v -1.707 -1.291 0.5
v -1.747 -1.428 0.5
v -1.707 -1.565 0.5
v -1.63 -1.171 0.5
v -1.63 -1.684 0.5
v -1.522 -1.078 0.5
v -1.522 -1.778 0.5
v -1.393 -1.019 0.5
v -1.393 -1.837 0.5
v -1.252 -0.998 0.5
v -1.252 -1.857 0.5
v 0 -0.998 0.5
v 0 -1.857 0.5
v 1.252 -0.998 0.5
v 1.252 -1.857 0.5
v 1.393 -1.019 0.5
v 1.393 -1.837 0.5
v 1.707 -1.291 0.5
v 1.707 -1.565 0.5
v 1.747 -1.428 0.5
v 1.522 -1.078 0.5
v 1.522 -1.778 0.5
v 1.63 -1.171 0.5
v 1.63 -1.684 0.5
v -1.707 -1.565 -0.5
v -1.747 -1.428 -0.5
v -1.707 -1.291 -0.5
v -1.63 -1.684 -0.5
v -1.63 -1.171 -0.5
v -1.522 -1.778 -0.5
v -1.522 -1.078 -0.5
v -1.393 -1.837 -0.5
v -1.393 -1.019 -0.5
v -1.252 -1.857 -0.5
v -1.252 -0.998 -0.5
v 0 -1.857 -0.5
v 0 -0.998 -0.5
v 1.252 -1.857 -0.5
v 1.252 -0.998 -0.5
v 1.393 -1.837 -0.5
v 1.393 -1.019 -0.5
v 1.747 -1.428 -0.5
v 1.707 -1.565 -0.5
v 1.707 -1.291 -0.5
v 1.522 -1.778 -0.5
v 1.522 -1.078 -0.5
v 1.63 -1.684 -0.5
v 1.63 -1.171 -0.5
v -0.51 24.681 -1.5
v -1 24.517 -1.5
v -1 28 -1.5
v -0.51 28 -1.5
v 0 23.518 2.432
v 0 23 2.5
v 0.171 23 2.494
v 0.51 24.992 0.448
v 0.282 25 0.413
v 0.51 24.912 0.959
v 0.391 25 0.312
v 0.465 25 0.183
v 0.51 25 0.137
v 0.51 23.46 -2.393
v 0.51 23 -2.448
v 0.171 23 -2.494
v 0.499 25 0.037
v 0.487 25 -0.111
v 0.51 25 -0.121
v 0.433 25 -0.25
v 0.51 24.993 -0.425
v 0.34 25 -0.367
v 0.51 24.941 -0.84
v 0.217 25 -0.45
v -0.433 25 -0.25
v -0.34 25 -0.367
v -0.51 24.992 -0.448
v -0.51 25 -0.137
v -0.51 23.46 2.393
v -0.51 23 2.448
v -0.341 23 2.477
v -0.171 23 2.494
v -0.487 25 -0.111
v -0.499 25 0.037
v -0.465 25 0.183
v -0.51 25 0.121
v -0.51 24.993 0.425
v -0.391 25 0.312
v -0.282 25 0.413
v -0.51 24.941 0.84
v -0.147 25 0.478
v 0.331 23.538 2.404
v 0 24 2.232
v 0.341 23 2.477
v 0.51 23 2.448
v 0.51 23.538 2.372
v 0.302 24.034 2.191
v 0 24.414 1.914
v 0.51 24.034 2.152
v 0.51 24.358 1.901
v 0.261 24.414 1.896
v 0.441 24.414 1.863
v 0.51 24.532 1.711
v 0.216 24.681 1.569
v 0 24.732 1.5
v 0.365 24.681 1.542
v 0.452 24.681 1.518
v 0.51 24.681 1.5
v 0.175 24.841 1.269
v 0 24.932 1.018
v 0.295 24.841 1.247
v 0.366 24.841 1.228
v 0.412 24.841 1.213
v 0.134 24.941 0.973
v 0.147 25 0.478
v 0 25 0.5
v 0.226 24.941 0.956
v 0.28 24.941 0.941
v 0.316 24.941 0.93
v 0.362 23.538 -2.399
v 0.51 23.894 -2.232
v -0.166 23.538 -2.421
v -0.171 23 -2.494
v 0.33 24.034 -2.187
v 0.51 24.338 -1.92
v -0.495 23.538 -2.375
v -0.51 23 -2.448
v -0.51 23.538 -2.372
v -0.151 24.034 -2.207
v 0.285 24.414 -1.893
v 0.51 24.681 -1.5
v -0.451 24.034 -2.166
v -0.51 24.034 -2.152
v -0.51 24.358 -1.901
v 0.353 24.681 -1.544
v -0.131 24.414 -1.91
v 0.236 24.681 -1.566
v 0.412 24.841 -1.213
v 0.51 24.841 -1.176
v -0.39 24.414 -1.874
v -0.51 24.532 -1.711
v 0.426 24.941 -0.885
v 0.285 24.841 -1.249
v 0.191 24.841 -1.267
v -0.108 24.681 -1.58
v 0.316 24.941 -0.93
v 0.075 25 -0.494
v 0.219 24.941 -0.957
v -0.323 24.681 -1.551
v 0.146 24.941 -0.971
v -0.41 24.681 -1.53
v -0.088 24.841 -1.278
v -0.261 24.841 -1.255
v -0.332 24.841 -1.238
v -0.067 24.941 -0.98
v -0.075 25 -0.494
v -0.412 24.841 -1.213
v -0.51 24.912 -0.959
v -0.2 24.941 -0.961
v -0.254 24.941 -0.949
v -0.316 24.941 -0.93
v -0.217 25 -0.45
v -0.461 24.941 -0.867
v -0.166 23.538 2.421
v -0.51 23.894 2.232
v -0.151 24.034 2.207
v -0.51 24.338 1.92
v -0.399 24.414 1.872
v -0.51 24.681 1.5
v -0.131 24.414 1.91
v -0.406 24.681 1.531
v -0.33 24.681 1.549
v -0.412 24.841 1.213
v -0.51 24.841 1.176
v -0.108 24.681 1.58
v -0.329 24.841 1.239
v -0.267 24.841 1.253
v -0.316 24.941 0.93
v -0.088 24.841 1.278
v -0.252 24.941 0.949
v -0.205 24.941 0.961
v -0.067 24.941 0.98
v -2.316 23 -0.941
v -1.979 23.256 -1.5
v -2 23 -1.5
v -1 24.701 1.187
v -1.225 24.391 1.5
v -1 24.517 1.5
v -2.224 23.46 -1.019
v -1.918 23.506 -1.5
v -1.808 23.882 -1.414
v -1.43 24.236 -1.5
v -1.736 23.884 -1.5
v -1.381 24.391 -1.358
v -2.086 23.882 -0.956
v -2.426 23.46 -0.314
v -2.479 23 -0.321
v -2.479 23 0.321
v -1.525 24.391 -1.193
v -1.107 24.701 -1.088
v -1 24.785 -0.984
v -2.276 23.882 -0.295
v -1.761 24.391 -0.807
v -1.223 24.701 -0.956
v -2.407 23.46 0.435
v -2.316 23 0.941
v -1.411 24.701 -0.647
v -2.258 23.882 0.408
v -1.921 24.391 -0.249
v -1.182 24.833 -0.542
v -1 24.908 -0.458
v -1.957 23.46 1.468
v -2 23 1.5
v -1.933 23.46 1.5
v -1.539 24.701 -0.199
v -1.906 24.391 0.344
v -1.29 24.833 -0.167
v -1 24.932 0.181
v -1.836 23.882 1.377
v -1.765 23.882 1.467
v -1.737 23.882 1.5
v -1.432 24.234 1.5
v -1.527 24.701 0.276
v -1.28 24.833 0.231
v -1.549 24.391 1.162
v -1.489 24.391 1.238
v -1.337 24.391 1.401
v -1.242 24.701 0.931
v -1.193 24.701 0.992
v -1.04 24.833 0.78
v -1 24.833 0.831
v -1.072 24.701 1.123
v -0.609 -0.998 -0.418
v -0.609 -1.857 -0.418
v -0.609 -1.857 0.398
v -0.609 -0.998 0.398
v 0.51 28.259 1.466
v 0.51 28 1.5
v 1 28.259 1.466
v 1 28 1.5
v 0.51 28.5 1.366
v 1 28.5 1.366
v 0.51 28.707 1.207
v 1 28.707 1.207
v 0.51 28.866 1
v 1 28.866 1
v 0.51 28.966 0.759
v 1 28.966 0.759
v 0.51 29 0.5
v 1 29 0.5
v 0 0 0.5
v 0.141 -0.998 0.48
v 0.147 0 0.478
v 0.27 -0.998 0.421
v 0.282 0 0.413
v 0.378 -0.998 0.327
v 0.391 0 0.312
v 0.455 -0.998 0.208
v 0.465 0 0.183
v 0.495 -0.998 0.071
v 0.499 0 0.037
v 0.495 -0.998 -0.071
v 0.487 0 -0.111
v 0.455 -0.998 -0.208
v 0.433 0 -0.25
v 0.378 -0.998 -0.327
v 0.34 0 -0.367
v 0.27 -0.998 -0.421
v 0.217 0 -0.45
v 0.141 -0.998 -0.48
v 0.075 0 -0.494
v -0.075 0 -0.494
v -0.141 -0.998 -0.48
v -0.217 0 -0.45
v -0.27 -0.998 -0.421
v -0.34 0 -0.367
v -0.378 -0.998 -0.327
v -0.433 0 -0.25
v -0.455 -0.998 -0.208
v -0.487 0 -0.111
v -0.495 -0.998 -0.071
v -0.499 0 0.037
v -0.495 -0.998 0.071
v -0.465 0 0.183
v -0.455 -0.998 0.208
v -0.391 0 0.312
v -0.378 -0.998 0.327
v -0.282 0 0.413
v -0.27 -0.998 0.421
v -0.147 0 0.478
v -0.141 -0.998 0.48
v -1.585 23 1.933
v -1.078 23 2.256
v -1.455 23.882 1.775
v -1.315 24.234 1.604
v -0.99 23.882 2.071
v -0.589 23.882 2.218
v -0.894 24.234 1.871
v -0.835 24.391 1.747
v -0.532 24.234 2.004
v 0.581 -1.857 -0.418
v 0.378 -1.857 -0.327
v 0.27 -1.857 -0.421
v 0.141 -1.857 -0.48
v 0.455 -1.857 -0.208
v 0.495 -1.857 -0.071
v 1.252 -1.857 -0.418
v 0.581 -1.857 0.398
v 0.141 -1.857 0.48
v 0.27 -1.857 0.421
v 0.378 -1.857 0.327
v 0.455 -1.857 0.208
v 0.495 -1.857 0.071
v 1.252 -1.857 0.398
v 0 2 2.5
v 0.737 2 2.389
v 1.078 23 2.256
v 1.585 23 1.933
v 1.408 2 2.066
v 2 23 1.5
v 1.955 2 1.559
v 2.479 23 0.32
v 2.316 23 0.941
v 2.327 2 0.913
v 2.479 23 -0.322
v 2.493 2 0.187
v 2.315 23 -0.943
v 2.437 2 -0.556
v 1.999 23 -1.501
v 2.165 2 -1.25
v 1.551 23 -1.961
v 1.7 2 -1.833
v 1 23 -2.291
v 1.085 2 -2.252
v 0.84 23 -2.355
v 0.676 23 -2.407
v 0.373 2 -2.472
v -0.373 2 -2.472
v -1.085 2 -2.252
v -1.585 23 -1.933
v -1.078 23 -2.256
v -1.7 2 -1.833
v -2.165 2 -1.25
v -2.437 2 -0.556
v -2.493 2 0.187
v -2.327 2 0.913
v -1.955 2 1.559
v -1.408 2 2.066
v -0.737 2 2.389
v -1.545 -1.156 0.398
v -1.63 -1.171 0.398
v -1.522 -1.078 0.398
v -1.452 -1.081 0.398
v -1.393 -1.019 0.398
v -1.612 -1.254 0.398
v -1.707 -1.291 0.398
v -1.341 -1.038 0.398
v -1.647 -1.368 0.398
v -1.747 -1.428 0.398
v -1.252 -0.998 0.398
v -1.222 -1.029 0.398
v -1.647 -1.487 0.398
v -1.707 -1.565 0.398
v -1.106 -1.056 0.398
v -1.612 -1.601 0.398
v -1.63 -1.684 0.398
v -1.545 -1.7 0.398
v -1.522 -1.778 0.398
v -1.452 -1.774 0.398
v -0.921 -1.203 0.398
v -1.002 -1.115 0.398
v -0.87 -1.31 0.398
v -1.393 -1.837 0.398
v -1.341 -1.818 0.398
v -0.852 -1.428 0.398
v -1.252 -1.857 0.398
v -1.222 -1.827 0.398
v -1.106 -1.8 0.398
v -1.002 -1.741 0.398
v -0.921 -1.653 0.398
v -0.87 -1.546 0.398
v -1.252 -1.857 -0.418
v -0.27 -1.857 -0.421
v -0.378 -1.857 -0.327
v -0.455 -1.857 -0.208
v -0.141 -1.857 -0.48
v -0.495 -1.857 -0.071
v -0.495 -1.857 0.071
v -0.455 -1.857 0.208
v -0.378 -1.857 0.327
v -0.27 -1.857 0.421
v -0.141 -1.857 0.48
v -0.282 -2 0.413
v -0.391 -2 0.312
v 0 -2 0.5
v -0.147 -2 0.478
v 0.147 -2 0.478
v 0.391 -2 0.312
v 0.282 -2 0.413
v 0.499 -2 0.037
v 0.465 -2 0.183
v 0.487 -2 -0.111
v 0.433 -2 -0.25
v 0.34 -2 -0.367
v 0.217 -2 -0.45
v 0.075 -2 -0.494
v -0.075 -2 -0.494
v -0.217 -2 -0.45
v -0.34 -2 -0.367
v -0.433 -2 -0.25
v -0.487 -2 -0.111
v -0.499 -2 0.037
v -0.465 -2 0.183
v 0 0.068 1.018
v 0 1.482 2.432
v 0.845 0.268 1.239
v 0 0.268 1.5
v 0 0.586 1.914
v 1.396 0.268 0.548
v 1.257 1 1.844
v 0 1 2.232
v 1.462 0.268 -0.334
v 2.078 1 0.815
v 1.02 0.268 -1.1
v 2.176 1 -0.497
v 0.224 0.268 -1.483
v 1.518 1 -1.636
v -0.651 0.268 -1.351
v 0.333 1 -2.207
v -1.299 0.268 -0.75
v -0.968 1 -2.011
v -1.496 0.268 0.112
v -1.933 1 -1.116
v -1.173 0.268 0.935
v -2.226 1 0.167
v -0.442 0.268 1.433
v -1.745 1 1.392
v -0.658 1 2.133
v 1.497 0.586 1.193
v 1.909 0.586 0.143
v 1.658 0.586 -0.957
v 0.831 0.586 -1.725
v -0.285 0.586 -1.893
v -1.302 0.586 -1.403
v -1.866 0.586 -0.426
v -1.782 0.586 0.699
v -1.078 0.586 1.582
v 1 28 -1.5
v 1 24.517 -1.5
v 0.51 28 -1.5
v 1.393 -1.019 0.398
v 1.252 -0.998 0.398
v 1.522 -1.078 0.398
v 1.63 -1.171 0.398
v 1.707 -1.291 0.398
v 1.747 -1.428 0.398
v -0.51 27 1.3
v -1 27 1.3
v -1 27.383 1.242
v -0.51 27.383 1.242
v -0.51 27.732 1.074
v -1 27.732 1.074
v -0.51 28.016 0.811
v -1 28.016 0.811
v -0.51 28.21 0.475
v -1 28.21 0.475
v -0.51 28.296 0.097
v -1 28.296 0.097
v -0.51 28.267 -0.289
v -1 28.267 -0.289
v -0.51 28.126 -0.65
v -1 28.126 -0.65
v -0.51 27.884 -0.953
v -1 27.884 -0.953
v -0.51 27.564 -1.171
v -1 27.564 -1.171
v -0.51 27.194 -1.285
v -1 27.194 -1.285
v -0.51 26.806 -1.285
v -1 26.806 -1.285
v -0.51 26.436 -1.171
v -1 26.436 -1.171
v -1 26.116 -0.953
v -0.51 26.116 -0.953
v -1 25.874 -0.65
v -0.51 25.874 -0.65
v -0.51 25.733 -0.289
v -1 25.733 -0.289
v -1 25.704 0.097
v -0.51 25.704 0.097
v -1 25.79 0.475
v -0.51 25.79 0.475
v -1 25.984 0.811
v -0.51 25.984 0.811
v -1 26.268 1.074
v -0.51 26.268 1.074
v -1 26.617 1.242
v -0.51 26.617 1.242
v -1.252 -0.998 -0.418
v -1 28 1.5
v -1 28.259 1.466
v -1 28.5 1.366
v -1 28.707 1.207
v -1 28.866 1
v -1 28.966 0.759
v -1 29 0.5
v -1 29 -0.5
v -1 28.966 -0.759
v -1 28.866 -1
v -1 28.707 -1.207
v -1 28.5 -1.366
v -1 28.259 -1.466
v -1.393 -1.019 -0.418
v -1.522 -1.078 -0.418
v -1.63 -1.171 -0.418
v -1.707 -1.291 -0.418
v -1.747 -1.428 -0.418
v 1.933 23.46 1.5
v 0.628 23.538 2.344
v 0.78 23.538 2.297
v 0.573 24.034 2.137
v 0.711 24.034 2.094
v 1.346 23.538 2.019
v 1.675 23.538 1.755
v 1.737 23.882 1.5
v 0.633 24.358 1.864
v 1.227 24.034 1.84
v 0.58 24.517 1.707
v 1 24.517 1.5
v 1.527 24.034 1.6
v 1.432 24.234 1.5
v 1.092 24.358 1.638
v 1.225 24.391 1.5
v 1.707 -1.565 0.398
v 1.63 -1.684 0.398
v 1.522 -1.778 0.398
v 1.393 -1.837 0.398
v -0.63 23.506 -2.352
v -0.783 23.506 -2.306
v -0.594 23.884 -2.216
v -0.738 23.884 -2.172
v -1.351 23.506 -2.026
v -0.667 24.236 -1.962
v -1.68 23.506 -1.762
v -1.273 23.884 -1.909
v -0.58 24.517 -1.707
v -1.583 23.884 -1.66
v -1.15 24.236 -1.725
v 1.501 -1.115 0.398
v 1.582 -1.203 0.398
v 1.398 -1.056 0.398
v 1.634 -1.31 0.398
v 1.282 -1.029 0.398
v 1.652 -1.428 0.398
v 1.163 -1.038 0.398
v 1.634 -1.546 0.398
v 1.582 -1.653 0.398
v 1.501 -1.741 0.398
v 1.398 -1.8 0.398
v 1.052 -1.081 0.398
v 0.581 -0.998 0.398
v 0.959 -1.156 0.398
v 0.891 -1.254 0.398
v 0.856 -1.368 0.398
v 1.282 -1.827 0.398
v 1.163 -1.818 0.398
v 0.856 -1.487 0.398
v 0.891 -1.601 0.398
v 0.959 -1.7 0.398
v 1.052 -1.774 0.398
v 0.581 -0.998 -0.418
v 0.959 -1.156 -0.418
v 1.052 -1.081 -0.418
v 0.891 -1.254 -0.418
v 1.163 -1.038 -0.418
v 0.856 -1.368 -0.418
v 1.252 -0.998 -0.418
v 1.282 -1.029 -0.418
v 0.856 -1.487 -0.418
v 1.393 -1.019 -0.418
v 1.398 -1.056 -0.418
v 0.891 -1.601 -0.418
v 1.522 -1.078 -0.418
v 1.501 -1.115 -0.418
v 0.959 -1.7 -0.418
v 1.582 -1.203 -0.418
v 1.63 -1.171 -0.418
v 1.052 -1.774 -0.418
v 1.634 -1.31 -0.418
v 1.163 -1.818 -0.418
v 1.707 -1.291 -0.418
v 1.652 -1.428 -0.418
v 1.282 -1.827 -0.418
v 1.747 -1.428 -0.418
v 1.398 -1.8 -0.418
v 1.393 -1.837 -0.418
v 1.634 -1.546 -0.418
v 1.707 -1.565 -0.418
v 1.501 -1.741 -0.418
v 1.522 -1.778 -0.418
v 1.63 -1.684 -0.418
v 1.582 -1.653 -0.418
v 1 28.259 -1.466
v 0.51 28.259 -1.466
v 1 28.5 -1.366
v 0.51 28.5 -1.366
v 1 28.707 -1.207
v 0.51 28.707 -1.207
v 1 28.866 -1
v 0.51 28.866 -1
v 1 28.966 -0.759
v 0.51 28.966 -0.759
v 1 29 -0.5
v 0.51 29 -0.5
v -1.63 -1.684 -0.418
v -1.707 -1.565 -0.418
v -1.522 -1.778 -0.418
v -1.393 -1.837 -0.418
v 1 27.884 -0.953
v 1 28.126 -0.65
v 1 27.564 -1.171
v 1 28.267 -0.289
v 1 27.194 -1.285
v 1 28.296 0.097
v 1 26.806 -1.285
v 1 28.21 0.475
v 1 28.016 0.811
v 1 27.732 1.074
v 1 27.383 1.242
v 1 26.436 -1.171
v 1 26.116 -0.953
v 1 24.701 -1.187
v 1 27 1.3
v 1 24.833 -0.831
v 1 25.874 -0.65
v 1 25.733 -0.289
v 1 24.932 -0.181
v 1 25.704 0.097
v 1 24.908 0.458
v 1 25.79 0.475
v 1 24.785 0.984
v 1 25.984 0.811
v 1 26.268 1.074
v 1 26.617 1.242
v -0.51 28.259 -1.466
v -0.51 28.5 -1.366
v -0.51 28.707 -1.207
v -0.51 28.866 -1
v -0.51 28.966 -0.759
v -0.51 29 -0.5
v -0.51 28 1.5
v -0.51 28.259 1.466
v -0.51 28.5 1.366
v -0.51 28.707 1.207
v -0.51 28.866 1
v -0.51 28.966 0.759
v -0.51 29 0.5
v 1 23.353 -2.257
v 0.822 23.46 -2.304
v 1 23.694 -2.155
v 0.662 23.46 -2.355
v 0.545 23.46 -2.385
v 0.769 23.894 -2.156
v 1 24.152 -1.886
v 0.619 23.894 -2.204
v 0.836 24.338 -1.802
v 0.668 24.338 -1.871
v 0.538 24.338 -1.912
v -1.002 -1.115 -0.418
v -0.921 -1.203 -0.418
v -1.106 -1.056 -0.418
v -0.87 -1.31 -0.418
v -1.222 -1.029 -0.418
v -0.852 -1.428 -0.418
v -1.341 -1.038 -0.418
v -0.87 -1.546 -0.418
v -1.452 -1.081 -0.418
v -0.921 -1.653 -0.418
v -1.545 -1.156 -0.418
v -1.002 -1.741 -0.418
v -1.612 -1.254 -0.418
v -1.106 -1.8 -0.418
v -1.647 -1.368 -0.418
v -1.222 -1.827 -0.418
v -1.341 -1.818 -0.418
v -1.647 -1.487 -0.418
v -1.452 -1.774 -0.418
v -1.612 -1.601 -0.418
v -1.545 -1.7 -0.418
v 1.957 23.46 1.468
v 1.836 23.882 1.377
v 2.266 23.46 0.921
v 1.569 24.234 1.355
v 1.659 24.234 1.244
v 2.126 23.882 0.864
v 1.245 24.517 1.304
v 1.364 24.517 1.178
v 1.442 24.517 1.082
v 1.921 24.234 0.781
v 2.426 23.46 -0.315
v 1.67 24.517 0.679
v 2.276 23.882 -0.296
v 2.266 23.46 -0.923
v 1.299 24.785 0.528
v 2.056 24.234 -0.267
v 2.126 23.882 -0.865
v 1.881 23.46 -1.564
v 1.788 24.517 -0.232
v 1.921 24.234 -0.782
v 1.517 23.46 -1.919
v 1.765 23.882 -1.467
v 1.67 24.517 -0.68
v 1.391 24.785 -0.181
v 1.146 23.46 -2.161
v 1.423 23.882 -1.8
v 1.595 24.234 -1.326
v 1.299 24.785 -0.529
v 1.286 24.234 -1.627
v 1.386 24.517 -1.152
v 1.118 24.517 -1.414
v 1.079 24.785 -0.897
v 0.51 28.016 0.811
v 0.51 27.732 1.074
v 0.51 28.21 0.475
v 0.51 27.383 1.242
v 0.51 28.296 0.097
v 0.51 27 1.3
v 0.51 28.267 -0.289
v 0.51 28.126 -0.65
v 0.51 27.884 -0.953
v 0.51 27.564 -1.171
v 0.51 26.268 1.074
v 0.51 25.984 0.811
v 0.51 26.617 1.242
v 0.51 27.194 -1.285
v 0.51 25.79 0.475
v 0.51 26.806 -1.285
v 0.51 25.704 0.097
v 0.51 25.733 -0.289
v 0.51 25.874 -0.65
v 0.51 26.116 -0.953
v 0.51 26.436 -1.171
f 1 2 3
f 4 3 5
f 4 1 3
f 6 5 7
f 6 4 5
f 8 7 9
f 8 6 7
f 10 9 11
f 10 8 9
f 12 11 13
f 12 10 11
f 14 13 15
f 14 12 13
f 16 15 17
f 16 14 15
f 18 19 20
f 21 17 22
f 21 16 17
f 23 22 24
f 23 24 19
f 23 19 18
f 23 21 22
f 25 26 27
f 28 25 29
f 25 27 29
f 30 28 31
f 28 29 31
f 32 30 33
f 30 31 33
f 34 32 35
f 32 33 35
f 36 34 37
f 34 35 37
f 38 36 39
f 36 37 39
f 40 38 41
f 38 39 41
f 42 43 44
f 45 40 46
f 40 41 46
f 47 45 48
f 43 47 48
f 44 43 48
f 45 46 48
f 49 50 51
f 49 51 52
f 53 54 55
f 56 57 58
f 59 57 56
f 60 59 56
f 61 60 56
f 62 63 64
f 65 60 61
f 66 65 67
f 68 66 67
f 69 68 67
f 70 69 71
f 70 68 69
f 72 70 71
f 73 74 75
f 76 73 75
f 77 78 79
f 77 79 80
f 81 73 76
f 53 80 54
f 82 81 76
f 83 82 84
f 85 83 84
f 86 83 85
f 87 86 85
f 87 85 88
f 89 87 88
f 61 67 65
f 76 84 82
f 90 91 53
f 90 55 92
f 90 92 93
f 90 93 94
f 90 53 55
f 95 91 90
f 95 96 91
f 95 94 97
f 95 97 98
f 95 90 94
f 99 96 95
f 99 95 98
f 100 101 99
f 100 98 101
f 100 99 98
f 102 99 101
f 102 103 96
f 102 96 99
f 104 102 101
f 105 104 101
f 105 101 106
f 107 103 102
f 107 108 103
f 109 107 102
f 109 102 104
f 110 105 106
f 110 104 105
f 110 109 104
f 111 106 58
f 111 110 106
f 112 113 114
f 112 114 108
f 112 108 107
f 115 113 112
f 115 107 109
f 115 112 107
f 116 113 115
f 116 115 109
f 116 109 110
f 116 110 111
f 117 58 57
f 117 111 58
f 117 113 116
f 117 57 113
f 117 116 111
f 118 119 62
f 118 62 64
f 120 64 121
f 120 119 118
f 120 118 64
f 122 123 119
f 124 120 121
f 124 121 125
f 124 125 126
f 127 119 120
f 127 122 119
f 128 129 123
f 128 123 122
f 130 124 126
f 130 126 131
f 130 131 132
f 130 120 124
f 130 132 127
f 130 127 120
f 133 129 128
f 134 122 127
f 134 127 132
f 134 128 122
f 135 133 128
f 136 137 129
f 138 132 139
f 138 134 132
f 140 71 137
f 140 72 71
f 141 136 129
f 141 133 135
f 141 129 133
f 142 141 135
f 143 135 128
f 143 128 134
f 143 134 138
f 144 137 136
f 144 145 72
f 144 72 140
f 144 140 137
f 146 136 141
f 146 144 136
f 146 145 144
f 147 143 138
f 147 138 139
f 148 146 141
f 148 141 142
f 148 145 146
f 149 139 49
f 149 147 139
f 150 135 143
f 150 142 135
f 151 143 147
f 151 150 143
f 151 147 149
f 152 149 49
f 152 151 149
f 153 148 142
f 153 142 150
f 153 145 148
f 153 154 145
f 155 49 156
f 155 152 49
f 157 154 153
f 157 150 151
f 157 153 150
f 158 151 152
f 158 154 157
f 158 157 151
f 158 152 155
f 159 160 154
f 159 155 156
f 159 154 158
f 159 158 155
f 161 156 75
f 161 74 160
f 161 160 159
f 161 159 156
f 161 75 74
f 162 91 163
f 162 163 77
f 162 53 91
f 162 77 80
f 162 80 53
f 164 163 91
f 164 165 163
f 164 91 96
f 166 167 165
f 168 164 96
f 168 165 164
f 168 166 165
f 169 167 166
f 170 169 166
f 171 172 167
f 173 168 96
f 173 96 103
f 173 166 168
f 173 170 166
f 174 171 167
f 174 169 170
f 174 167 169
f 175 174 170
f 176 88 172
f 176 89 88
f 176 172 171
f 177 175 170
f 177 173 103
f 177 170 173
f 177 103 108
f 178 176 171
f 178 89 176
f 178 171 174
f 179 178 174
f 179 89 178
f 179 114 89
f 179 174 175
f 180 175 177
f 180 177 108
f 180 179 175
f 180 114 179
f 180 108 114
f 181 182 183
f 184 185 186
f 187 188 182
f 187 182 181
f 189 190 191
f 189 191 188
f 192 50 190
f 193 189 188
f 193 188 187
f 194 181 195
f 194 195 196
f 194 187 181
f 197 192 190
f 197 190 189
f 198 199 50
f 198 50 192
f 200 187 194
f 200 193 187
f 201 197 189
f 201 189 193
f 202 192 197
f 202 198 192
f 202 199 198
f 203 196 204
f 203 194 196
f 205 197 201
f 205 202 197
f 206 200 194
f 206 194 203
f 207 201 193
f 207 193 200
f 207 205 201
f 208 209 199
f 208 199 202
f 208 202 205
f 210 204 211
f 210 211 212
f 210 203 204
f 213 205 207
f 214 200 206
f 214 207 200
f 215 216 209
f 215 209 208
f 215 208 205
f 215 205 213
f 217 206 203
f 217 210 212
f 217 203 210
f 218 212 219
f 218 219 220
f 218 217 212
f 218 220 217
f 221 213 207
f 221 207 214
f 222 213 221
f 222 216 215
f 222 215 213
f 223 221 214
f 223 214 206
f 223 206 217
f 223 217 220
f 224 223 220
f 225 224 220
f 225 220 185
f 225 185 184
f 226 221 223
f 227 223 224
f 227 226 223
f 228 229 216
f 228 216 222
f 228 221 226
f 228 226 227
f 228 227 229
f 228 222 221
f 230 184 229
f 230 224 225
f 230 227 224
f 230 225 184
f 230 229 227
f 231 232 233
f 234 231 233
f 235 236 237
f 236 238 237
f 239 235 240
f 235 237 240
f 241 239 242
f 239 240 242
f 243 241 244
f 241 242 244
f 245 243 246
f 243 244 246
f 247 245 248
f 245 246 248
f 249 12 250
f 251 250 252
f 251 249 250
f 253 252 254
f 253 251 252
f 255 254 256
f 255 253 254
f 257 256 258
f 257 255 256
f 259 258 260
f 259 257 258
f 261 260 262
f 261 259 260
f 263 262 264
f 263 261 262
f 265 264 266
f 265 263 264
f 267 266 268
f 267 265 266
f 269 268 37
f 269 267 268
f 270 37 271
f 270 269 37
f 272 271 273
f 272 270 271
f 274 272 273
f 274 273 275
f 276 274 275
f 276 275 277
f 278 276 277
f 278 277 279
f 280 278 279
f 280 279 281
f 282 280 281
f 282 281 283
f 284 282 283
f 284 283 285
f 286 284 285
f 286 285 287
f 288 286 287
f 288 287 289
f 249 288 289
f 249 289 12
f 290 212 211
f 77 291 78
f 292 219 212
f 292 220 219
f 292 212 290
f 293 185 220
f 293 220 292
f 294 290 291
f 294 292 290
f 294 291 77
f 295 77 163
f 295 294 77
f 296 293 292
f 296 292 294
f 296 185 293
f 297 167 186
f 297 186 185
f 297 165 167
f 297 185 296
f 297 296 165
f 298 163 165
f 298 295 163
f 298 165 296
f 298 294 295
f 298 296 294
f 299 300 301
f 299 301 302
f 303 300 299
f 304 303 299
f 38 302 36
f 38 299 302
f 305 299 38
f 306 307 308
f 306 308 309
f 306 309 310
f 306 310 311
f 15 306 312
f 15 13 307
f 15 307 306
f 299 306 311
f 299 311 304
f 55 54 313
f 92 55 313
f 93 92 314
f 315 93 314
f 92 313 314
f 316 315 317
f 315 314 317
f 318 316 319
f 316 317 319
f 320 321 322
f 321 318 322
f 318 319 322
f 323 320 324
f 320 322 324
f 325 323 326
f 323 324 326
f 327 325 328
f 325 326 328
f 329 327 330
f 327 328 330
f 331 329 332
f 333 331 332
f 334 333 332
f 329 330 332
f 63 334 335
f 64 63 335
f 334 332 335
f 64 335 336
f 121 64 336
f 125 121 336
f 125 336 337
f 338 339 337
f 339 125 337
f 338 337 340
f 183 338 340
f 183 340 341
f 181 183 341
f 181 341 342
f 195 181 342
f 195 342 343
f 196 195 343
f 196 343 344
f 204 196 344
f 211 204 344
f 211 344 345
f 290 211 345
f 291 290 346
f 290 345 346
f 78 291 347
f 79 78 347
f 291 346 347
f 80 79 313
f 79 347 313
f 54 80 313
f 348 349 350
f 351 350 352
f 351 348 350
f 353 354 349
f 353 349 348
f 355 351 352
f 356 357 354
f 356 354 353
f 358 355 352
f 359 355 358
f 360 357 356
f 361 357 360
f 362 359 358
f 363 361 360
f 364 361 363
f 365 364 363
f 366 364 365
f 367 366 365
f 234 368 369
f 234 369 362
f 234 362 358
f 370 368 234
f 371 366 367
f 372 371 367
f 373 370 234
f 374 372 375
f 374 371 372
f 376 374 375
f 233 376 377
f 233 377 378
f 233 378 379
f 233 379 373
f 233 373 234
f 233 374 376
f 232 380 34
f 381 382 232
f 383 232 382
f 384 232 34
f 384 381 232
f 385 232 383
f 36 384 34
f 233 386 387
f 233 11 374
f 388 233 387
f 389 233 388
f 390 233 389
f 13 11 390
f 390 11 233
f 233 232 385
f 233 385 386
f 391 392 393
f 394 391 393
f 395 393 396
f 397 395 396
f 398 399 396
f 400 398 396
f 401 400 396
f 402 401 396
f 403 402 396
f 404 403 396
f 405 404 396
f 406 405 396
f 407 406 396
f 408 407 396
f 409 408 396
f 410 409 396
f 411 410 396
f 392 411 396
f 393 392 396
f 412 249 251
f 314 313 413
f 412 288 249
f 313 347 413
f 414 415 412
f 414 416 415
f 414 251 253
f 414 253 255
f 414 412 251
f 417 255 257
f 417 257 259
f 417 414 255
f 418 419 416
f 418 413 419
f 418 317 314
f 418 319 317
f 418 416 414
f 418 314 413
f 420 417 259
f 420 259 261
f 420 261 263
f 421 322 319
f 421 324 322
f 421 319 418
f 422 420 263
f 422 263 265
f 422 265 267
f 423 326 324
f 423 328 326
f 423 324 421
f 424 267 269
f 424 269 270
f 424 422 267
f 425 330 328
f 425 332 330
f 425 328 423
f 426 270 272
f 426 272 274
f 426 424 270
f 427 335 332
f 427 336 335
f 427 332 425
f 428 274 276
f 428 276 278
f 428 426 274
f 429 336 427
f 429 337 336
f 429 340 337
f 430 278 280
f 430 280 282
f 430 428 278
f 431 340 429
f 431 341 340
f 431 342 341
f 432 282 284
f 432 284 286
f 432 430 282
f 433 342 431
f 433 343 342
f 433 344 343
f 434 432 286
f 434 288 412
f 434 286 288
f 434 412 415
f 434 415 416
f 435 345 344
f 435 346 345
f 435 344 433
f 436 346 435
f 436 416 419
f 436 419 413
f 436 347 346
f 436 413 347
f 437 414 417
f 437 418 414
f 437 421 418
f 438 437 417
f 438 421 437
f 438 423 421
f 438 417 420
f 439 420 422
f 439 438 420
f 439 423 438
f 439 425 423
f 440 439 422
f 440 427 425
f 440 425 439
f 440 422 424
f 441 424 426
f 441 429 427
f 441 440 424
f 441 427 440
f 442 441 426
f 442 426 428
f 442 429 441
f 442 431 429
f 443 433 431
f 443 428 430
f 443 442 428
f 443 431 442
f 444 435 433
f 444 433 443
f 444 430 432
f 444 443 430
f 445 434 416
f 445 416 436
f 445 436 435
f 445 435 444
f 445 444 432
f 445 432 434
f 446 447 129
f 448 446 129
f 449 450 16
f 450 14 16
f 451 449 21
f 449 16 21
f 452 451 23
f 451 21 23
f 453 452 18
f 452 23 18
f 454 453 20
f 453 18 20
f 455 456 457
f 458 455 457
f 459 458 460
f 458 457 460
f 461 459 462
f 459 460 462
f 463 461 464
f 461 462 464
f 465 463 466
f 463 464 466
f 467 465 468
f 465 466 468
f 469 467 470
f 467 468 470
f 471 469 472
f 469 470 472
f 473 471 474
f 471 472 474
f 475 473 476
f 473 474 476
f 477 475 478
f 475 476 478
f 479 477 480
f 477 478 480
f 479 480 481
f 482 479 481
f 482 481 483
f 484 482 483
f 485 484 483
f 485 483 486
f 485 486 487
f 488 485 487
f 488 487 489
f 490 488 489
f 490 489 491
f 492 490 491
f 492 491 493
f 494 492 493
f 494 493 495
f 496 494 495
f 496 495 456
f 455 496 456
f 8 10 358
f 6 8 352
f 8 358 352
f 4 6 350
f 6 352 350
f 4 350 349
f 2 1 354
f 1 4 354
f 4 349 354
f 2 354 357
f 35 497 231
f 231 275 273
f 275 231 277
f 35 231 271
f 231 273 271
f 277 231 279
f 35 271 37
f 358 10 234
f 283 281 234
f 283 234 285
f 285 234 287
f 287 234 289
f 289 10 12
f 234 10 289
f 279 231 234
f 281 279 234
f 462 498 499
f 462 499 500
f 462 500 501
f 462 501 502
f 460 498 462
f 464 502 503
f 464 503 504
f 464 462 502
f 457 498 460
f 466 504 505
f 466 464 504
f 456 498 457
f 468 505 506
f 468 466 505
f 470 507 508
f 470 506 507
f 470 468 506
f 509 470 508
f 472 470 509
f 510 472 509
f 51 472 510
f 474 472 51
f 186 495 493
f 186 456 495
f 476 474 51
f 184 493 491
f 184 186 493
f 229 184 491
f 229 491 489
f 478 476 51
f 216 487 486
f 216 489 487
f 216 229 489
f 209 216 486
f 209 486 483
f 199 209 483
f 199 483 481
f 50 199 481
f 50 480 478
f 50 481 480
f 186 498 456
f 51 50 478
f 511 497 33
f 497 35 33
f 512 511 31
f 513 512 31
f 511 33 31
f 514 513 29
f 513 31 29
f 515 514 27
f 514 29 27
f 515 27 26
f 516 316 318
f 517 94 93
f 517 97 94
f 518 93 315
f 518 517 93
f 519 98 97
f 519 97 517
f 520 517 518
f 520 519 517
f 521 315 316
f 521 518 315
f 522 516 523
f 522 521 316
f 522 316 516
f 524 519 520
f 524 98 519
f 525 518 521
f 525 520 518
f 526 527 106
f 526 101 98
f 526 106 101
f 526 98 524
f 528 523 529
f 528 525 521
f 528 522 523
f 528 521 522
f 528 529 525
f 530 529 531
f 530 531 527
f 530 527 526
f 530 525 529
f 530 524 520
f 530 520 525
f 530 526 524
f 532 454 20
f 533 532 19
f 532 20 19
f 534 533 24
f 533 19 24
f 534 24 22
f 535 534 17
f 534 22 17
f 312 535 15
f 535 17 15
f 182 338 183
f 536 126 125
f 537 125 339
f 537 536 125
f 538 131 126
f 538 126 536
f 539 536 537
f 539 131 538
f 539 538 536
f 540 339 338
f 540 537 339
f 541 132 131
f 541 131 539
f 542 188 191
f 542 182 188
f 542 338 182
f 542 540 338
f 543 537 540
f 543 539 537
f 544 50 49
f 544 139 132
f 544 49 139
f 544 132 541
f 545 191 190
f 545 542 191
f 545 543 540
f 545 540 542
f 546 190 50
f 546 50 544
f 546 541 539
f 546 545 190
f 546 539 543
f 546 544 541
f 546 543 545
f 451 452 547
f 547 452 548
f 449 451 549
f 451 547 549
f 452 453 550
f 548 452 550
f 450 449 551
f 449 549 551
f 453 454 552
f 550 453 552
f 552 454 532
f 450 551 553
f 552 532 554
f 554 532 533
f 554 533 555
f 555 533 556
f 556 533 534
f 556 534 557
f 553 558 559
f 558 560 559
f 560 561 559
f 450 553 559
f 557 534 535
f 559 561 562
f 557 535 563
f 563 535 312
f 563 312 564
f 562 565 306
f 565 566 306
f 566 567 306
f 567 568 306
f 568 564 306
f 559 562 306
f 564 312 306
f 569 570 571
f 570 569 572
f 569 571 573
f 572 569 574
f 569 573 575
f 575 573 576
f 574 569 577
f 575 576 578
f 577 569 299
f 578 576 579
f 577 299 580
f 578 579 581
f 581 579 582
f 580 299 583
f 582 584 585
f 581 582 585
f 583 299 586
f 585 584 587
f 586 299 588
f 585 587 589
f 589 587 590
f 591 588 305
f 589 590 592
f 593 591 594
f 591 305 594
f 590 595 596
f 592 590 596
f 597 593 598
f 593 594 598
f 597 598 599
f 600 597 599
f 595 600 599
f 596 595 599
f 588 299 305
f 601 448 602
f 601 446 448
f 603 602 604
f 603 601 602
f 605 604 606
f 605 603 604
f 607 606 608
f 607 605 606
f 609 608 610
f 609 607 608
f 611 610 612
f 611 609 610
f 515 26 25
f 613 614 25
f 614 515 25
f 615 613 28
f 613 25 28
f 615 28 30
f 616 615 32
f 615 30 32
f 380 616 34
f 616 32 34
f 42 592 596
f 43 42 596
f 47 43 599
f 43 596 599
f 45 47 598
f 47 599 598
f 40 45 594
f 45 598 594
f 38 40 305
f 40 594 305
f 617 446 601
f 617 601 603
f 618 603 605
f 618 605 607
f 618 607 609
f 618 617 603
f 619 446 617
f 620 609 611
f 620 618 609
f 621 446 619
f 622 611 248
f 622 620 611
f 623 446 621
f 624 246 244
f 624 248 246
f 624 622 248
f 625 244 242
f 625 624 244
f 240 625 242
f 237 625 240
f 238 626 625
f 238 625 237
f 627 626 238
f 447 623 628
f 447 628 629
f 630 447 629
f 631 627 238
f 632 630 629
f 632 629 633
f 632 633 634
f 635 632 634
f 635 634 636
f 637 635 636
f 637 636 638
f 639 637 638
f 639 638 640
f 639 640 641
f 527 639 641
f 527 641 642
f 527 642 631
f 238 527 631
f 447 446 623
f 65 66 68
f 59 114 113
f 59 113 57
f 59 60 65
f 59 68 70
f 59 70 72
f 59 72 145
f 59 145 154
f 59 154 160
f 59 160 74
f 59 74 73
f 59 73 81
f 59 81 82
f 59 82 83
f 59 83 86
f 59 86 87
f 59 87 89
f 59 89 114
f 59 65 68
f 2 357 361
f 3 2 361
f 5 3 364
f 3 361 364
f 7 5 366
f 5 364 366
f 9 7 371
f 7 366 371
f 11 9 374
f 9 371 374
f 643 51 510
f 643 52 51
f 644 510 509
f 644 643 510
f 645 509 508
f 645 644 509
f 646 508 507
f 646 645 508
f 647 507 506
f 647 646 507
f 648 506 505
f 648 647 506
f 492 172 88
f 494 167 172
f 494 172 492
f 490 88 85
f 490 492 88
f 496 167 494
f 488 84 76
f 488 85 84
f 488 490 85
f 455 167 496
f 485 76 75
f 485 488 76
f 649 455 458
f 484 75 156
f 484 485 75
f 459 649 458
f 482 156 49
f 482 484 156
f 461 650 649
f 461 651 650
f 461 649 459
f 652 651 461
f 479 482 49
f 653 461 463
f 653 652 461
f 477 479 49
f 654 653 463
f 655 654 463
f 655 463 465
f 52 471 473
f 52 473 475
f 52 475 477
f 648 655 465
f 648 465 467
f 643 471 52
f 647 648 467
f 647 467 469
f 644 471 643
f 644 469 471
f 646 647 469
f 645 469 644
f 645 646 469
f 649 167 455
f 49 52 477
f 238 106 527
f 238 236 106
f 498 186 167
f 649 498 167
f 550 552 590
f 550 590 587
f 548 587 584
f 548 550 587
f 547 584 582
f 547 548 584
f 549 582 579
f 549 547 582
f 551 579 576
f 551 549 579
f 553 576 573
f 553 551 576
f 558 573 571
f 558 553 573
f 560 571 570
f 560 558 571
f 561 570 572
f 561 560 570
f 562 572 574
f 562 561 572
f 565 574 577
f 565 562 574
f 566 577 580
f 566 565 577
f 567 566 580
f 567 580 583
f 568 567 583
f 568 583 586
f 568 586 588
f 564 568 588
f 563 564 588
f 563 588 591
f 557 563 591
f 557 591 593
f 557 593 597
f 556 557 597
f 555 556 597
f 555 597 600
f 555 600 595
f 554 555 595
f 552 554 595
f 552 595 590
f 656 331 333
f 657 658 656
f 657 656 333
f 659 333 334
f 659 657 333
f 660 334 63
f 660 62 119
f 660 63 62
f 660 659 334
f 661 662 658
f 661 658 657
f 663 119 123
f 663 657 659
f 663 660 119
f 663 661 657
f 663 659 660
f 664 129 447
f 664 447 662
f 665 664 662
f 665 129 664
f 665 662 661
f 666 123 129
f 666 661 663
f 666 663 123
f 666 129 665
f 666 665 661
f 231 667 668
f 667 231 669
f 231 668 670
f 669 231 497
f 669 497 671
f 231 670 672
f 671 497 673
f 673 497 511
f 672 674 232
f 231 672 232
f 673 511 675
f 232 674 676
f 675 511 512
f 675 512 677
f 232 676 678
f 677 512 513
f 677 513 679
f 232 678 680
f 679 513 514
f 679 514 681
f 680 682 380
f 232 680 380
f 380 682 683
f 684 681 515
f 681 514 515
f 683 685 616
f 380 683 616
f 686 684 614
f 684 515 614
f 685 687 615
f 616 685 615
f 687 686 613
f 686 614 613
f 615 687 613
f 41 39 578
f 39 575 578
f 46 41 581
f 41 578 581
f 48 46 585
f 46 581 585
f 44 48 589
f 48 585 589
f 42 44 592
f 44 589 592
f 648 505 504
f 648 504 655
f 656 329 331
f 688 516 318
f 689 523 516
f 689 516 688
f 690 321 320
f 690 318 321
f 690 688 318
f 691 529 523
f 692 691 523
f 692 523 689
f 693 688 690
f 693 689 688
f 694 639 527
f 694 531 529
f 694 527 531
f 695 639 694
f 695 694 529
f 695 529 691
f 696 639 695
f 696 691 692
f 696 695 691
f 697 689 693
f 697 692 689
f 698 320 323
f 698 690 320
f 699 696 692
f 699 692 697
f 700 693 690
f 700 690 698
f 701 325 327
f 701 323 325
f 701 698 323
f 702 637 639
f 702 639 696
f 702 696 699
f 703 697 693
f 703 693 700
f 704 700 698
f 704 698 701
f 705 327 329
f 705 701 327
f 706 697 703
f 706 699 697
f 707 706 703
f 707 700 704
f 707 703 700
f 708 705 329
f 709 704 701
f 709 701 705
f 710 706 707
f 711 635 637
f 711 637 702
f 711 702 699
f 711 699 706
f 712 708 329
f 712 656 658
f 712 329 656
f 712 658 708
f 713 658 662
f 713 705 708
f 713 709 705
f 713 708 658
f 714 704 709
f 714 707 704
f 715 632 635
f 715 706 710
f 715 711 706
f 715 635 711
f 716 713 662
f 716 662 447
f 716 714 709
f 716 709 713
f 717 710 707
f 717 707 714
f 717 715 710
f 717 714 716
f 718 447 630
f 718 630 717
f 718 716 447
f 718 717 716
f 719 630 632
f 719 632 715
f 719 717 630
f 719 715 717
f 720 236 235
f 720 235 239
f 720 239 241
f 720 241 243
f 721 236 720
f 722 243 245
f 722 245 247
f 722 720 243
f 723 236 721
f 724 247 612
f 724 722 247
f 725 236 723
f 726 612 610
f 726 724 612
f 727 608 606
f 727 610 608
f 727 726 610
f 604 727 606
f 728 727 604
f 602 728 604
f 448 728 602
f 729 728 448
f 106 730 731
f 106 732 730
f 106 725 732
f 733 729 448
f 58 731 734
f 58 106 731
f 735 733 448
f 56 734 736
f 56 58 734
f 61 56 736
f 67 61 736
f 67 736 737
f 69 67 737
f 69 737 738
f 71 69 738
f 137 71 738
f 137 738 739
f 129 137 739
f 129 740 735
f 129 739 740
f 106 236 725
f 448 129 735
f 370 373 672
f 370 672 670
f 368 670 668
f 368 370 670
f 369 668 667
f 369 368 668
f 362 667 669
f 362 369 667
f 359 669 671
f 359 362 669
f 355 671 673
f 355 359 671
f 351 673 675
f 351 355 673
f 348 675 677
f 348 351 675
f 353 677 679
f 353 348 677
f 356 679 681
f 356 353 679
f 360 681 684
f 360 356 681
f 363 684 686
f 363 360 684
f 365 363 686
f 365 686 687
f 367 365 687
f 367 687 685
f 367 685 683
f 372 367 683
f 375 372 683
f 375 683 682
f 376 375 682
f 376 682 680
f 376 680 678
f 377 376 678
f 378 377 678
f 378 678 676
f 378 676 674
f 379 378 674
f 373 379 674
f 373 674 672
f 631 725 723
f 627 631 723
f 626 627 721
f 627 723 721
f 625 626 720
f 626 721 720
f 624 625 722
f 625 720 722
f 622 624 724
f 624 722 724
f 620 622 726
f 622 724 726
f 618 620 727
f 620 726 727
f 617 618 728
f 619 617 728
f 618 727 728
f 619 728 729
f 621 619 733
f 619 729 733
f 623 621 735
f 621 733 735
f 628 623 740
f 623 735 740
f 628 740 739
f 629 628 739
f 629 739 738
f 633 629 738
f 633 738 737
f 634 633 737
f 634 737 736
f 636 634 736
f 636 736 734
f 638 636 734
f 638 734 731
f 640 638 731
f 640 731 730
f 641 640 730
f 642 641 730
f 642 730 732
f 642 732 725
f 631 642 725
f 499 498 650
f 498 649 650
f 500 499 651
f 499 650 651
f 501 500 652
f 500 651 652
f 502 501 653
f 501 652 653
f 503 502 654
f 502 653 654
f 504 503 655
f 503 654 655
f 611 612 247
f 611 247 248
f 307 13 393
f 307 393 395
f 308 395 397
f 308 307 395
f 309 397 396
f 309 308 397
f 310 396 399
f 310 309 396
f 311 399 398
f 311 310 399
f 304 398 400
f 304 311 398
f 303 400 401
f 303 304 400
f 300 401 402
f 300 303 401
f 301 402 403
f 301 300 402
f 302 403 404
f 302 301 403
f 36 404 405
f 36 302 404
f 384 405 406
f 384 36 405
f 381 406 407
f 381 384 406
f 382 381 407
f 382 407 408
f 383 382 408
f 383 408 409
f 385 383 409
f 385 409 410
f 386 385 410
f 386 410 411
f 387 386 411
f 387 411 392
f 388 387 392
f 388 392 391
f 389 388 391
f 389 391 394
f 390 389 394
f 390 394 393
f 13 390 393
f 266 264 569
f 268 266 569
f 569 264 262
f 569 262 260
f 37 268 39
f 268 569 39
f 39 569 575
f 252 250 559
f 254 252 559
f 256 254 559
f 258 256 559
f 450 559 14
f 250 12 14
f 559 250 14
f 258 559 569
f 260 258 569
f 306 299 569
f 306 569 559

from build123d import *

# Parameters (mm, degrees)
SKETCH1_R           = 2.5
BOSS_EXTRUDE1_DEPTH = 25
SKETCH2_W           = 2
SKETCH2_H           = 3
SKETCH2_W_2         = 1
SKETCH2_H_2         = 2
BOSS_EXTRUDE2_DEPTH = 4
SKETCH3_W           = 1.019035956
SKETCH3_H           = 3.229242318
CUT_EXTRUDE1_DEPTH  = 4
SKETCH4_R           = 1.3
CUT_EXTRUDE2_DEPTH  = 4
FILLET1_R           = 1
FILLET2_R           = 2
SKETCH5_R           = 0.5
BOSS_EXTRUDE3_DEPTH = 2
SKETCH6_W           = 3.503526818
SKETCH6_H           = 0.85884316
BOSS_EXTRUDE4_DEPTH = 0.5
FILLET3_R           = 0.5
SKETCH7_W           = 0.309208581
SKETCH7_H           = 0.81541506
CUT_EXTRUDE6_DEPTH  = 1
LPATTERN1_COUNT     = 2
LPATTERN1_PITCH     = 1.5
FILLET4_R           = 0.5
CUT_EXTRUDE8_DEPTH  = 1
CUT_EXTRUDE9_DEPTH  = 1
SKETCH12_R          = 0.4
BOSS_EXTRUDE5_DEPTH = 1
SKETCH13_R          = 0.4
BOSS_EXTRUDE6_DEPTH = 1


with BuildPart() as part:
    # Sketch1 → Boss-Extrude1 (new body)
    with BuildSketch(Plane(origin=(0, 0, 0), x_dir=(1, 0, 0), z_dir=(0, 1, 0))):
        with Locations(Location((0, 0, 0), (0, 0, 270))):
            Circle(SKETCH1_R)
    extrude(amount=BOSS_EXTRUDE1_DEPTH)

    # Sketch2 → Boss-Extrude2 (add)
    with BuildSketch(Plane(origin=(0, 25, 0), x_dir=(1, 0, 0), z_dir=(0, 1, 0))):
        Rectangle(SKETCH2_W, SKETCH2_H)
        Rectangle(SKETCH2_W_2, SKETCH2_H_2, mode=Mode.SUBTRACT)
    extrude(amount=BOSS_EXTRUDE2_DEPTH)

    # Sketch3 → Cut-Extrude1 (cut)
    with BuildSketch(Plane(origin=(0, 29, 0), x_dir=(1, 0, 0), z_dir=(0, 1, 0))):
        Rectangle(SKETCH3_W, SKETCH3_H)
    extrude(amount=-CUT_EXTRUDE1_DEPTH, mode=Mode.SUBTRACT)

    # Sketch4 → Cut-Extrude2 (cut)
    with BuildSketch(Plane.ZY.offset(1)):
        with Locations((0, 27)):
            Circle(SKETCH4_R)
    extrude(amount=-CUT_EXTRUDE2_DEPTH, mode=Mode.SUBTRACT)

    # Fillet1
    fillet1_edges = [part.edges().sort_by_distance(p)[0] for p in [
        (-0.754758989, 29, 1.5),
        (0.754758989, 29, -1.5),
        (-0.754758989, 29, -1.5),
        (0.754758989, 29, 1.5),
    ]]
    fillet(fillet1_edges, radius=FILLET1_R)

    # Fillet2
    # the kernel refuses this fillet: 2 mm, written as the material it takes off along each edge
    with BuildSketch(Plane(origin=(0, 0, 0), x_dir=(0, 0, 1), z_dir=(-1, 0, 0))) as fillet2_piece_1:
        with BuildLine():
            CenterArc((2.5 - FILLET2_R, FILLET2_R), FILLET2_R, 270, 90)
            Line((2.5 - FILLET2_R, 0), (2.5, 0))
            Line((2.5, 0), (2.5, FILLET2_R))
        make_face()
    revolve(axis=Axis((0, 0, 0), (0, 1, 0)), mode=Mode.SUBTRACT)
    with BuildSketch(Plane(origin=(0, 25, 0), x_dir=(0, 0, 1), z_dir=(-1, 0, 0))) as fillet2_piece_2_section:
        with BuildLine():
            CenterArc((2.5 - FILLET2_R, -FILLET2_R), FILLET2_R, 0, 90)
            Line((2.5, -FILLET2_R), (2.5, 0))
            Line((2.5, 0), (2.5 - FILLET2_R, 0))
        make_face()
    fillet2_piece_2 = revolve(axis=Axis((0, 25, 0), (0, 1, 0)), mode=Mode.PRIVATE)
    fillet2_piece_2 = split(fillet2_piece_2, bisect_by=Plane(origin=(0.509517978, 24.924108372, -1.066767337), z_dir=(-1, 0, 0)), keep=Keep.TOP, mode=Mode.PRIVATE)
    fillet2_piece_2 = split(fillet2_piece_2, bisect_by=Plane(origin=(-0.509517978, 24.924108372, -1.066767337), z_dir=(1, 0, 0)), keep=Keep.TOP, mode=Mode.PRIVATE)
    add(fillet2_piece_2, mode=Mode.SUBTRACT)
    with BuildSketch(Plane(origin=(0, 25, 0), x_dir=(0, 0, 1), z_dir=(-1, 0, 0))) as fillet2_piece_3_section:
        with BuildLine():
            CenterArc((2.5 - FILLET2_R, -FILLET2_R), FILLET2_R, 0, 90)
            Line((2.5, -FILLET2_R), (2.5, 0))
            Line((2.5, 0), (2.5 - FILLET2_R, 0))
        make_face()
    fillet2_piece_3 = revolve(axis=Axis((0, 25, 0), (0, 1, 0)), mode=Mode.PRIVATE)
    fillet2_piece_3 = split(fillet2_piece_3, bisect_by=Plane(origin=(0.753348396, 24.487146264, 1.5), z_dir=(0, 0, 1)), keep=Keep.TOP, mode=Mode.PRIVATE)
    add(fillet2_piece_3, mode=Mode.SUBTRACT)
    with BuildSketch(Plane(origin=(0, 25, 0), x_dir=(0, 0, 1), z_dir=(-1, 0, 0))) as fillet2_piece_4_section:
        with BuildLine():
            CenterArc((2.5 - FILLET2_R, -FILLET2_R), FILLET2_R, 0, 90)
            Line((2.5, -FILLET2_R), (2.5, 0))
            Line((2.5, 0), (2.5 - FILLET2_R, 0))
        make_face()
    fillet2_piece_4 = revolve(axis=Axis((0, 25, 0), (0, 1, 0)), mode=Mode.PRIVATE)
    fillet2_piece_4 = split(fillet2_piece_4, bisect_by=Plane(origin=(1, 24.532221184, 1.15e-07), z_dir=(1, 0, 0)), keep=Keep.TOP, mode=Mode.PRIVATE)
    add(fillet2_piece_4, mode=Mode.SUBTRACT)
    with BuildSketch(Plane(origin=(0, 25, 0), x_dir=(0, 0, 1), z_dir=(-1, 0, 0))) as fillet2_piece_5_section:
        with BuildLine():
            CenterArc((2.5 - FILLET2_R, -FILLET2_R), FILLET2_R, 0, 90)
            Line((2.5, -FILLET2_R), (2.5, 0))
            Line((2.5, 0), (2.5 - FILLET2_R, 0))
        make_face()
    fillet2_piece_5 = revolve(axis=Axis((0, 25, 0), (0, 1, 0)), mode=Mode.PRIVATE)
    fillet2_piece_5 = split(fillet2_piece_5, bisect_by=Plane(origin=(0.753348395, 24.487146008, -1.5), z_dir=(0, 0, -1)), keep=Keep.TOP, mode=Mode.PRIVATE)
    add(fillet2_piece_5, mode=Mode.SUBTRACT)
    with BuildSketch(Plane(origin=(0, 25, 0), x_dir=(0, 0, 1), z_dir=(-1, 0, 0))) as fillet2_piece_6_section:
        with BuildLine():
            CenterArc((2.5 - FILLET2_R, -FILLET2_R), FILLET2_R, 0, 90)
            Line((2.5, -FILLET2_R), (2.5, 0))
            Line((2.5, 0), (2.5 - FILLET2_R, 0))
        make_face()
    fillet2_piece_6 = revolve(axis=Axis((0, 25, 0), (0, 1, 0)), mode=Mode.PRIVATE)
    fillet2_piece_6 = split(fillet2_piece_6, bisect_by=Plane(origin=(-1, 24.532221184, -1.16e-07), z_dir=(-1, 0, 0)), keep=Keep.TOP, mode=Mode.PRIVATE)
    add(fillet2_piece_6, mode=Mode.SUBTRACT)

    # Sketch5 → Boss-Extrude3 (add)
    with BuildSketch(Plane(origin=(0, 0, 0), x_dir=(1, 0, 0), z_dir=(0, 1, 0))):
        with Locations(Location((0, 0, 0), (0, 0, 270))):
            Circle(SKETCH5_R)
    extrude(amount=-BOSS_EXTRUDE3_DEPTH)

    # Sketch6 → Boss-Extrude4 (add, symmetric)
    with BuildSketch(Plane.XY):
        with Locations((0, -1.427875915)):
            Rectangle(SKETCH6_W, SKETCH6_H)
    extrude(amount=BOSS_EXTRUDE4_DEPTH, both=True)

    # Fillet3
    # the kernel refuses this fillet: 0.5 mm, written as the material it takes off along each edge
    with BuildSketch(Plane(origin=(1.751763409, -0.998454335, 1.75), x_dir=(-1, 0, 0), z_dir=(0, 0, -1)), Plane(origin=(1.751763409, -1.857297495, 1.75), x_dir=(0, 1, 0), z_dir=(0, 0, -1)), Plane(origin=(-1.751763409, -0.998454335, -1.75), x_dir=(1, 0, 0), z_dir=(0, 0, 1)), Plane(origin=(-1.751763409, -1.857297495, -1.75), x_dir=(0, 1, 0), z_dir=(0, 0, 1))) as fillet3_piece_1:
        with BuildLine():
            CenterArc((FILLET3_R, -FILLET3_R), FILLET3_R, 90, 90)
            Line((0, -FILLET3_R), (0, 0))
            Line((0, 0), (FILLET3_R, 0))
        make_face()
    extrude(amount=3.5, mode=Mode.SUBTRACT)

    # Sketch7 → Cut-Extrude6 (cut)
    with BuildSketch(Plane.XZ.offset(1.857297495)):
        with Locations((-0.76394551, -0.009835432)):
            Rectangle(SKETCH7_W, SKETCH7_H)
    cut_extrude6 = extrude(amount=-CUT_EXTRUDE6_DEPTH, mode=Mode.SUBTRACT)

    # LPattern1: Cut-Extrude6 ×2
    with Locations(*[(i * LPATTERN1_PITCH, 0, 0) for i in range(1, LPATTERN1_COUNT)]):
        add(cut_extrude6, mode=Mode.SUBTRACT)

    # Fillet4
    # the kernel refuses this fillet: 0.5 mm, written as the material it adds along each edge
    # the kernel refuses this fillet: 0.5 mm, written as the material it takes off along each edge
    with BuildSketch(Plane(origin=(-0.9185498, -0.998454335, -0.417542962), x_dir=(-1, 0, 0), z_dir=(0, 0, 1)), Plane(origin=(-0.9185498, -1.857297495, -0.417542962), x_dir=(0, 1, 0), z_dir=(0, 0, 1)), Plane(origin=(0.890658781, -0.998454335, 0.397872098), x_dir=(1, 0, 0), z_dir=(0, 0, -1)), Plane(origin=(0.890658781, -1.857297495, 0.397872098), x_dir=(0, 1, 0), z_dir=(0, 0, -1))) as fillet4_2_piece_1:
        with BuildLine():
            CenterArc((FILLET4_R, FILLET4_R), FILLET4_R, 180, 90)
            Line((0, FILLET4_R), (0, 0))
            Line((0, 0), (FILLET4_R, 0))
        make_face()
    extrude(amount=0.81541506, mode=Mode.SUBTRACT)

    # Sketch10 → Cut-Extrude8 (cut)
    with BuildSketch(Plane.XZ.offset(1.857297495)):
        Polygon((-0.923556177, 0.397872098), (-1.784787166, 0.397872098), (-1.784787166, -0.417542962), (-0.876989159, -0.417542962), (-0.876989159, 0.397872098), align=None)
    extrude(amount=-CUT_EXTRUDE8_DEPTH, mode=Mode.SUBTRACT)

    # Sketch11 → Cut-Extrude9 (cut)
    with BuildSketch(Plane(origin=(0, -1.857297495, 0), x_dir=(-1, 0, 0), z_dir=(0, -1, 0))):
        Polygon((-0.741652452, -0.397872098), (-1.858092241, -0.397872098), (-1.858092241, 0.417542962), (-0.783282411, 0.417542962), align=None)
    extrude(amount=-CUT_EXTRUDE9_DEPTH, mode=Mode.SUBTRACT)

    # Sketch12 → Boss-Extrude5 (add)
    with BuildSketch(Plane.XY.offset(0.5)):
        with Locations((-1.251763409, -1.427875915)):
            Circle(SKETCH12_R)
    extrude(amount=-BOSS_EXTRUDE5_DEPTH)

    # Sketch13 → Boss-Extrude6 (add)
    with BuildSketch(Plane.XY.offset(0.5)):
        with Locations((1.251763409, -1.427875915)):
            Circle(SKETCH13_R)
    extrude(amount=-BOSS_EXTRUDE6_DEPTH)


solid = part.part
